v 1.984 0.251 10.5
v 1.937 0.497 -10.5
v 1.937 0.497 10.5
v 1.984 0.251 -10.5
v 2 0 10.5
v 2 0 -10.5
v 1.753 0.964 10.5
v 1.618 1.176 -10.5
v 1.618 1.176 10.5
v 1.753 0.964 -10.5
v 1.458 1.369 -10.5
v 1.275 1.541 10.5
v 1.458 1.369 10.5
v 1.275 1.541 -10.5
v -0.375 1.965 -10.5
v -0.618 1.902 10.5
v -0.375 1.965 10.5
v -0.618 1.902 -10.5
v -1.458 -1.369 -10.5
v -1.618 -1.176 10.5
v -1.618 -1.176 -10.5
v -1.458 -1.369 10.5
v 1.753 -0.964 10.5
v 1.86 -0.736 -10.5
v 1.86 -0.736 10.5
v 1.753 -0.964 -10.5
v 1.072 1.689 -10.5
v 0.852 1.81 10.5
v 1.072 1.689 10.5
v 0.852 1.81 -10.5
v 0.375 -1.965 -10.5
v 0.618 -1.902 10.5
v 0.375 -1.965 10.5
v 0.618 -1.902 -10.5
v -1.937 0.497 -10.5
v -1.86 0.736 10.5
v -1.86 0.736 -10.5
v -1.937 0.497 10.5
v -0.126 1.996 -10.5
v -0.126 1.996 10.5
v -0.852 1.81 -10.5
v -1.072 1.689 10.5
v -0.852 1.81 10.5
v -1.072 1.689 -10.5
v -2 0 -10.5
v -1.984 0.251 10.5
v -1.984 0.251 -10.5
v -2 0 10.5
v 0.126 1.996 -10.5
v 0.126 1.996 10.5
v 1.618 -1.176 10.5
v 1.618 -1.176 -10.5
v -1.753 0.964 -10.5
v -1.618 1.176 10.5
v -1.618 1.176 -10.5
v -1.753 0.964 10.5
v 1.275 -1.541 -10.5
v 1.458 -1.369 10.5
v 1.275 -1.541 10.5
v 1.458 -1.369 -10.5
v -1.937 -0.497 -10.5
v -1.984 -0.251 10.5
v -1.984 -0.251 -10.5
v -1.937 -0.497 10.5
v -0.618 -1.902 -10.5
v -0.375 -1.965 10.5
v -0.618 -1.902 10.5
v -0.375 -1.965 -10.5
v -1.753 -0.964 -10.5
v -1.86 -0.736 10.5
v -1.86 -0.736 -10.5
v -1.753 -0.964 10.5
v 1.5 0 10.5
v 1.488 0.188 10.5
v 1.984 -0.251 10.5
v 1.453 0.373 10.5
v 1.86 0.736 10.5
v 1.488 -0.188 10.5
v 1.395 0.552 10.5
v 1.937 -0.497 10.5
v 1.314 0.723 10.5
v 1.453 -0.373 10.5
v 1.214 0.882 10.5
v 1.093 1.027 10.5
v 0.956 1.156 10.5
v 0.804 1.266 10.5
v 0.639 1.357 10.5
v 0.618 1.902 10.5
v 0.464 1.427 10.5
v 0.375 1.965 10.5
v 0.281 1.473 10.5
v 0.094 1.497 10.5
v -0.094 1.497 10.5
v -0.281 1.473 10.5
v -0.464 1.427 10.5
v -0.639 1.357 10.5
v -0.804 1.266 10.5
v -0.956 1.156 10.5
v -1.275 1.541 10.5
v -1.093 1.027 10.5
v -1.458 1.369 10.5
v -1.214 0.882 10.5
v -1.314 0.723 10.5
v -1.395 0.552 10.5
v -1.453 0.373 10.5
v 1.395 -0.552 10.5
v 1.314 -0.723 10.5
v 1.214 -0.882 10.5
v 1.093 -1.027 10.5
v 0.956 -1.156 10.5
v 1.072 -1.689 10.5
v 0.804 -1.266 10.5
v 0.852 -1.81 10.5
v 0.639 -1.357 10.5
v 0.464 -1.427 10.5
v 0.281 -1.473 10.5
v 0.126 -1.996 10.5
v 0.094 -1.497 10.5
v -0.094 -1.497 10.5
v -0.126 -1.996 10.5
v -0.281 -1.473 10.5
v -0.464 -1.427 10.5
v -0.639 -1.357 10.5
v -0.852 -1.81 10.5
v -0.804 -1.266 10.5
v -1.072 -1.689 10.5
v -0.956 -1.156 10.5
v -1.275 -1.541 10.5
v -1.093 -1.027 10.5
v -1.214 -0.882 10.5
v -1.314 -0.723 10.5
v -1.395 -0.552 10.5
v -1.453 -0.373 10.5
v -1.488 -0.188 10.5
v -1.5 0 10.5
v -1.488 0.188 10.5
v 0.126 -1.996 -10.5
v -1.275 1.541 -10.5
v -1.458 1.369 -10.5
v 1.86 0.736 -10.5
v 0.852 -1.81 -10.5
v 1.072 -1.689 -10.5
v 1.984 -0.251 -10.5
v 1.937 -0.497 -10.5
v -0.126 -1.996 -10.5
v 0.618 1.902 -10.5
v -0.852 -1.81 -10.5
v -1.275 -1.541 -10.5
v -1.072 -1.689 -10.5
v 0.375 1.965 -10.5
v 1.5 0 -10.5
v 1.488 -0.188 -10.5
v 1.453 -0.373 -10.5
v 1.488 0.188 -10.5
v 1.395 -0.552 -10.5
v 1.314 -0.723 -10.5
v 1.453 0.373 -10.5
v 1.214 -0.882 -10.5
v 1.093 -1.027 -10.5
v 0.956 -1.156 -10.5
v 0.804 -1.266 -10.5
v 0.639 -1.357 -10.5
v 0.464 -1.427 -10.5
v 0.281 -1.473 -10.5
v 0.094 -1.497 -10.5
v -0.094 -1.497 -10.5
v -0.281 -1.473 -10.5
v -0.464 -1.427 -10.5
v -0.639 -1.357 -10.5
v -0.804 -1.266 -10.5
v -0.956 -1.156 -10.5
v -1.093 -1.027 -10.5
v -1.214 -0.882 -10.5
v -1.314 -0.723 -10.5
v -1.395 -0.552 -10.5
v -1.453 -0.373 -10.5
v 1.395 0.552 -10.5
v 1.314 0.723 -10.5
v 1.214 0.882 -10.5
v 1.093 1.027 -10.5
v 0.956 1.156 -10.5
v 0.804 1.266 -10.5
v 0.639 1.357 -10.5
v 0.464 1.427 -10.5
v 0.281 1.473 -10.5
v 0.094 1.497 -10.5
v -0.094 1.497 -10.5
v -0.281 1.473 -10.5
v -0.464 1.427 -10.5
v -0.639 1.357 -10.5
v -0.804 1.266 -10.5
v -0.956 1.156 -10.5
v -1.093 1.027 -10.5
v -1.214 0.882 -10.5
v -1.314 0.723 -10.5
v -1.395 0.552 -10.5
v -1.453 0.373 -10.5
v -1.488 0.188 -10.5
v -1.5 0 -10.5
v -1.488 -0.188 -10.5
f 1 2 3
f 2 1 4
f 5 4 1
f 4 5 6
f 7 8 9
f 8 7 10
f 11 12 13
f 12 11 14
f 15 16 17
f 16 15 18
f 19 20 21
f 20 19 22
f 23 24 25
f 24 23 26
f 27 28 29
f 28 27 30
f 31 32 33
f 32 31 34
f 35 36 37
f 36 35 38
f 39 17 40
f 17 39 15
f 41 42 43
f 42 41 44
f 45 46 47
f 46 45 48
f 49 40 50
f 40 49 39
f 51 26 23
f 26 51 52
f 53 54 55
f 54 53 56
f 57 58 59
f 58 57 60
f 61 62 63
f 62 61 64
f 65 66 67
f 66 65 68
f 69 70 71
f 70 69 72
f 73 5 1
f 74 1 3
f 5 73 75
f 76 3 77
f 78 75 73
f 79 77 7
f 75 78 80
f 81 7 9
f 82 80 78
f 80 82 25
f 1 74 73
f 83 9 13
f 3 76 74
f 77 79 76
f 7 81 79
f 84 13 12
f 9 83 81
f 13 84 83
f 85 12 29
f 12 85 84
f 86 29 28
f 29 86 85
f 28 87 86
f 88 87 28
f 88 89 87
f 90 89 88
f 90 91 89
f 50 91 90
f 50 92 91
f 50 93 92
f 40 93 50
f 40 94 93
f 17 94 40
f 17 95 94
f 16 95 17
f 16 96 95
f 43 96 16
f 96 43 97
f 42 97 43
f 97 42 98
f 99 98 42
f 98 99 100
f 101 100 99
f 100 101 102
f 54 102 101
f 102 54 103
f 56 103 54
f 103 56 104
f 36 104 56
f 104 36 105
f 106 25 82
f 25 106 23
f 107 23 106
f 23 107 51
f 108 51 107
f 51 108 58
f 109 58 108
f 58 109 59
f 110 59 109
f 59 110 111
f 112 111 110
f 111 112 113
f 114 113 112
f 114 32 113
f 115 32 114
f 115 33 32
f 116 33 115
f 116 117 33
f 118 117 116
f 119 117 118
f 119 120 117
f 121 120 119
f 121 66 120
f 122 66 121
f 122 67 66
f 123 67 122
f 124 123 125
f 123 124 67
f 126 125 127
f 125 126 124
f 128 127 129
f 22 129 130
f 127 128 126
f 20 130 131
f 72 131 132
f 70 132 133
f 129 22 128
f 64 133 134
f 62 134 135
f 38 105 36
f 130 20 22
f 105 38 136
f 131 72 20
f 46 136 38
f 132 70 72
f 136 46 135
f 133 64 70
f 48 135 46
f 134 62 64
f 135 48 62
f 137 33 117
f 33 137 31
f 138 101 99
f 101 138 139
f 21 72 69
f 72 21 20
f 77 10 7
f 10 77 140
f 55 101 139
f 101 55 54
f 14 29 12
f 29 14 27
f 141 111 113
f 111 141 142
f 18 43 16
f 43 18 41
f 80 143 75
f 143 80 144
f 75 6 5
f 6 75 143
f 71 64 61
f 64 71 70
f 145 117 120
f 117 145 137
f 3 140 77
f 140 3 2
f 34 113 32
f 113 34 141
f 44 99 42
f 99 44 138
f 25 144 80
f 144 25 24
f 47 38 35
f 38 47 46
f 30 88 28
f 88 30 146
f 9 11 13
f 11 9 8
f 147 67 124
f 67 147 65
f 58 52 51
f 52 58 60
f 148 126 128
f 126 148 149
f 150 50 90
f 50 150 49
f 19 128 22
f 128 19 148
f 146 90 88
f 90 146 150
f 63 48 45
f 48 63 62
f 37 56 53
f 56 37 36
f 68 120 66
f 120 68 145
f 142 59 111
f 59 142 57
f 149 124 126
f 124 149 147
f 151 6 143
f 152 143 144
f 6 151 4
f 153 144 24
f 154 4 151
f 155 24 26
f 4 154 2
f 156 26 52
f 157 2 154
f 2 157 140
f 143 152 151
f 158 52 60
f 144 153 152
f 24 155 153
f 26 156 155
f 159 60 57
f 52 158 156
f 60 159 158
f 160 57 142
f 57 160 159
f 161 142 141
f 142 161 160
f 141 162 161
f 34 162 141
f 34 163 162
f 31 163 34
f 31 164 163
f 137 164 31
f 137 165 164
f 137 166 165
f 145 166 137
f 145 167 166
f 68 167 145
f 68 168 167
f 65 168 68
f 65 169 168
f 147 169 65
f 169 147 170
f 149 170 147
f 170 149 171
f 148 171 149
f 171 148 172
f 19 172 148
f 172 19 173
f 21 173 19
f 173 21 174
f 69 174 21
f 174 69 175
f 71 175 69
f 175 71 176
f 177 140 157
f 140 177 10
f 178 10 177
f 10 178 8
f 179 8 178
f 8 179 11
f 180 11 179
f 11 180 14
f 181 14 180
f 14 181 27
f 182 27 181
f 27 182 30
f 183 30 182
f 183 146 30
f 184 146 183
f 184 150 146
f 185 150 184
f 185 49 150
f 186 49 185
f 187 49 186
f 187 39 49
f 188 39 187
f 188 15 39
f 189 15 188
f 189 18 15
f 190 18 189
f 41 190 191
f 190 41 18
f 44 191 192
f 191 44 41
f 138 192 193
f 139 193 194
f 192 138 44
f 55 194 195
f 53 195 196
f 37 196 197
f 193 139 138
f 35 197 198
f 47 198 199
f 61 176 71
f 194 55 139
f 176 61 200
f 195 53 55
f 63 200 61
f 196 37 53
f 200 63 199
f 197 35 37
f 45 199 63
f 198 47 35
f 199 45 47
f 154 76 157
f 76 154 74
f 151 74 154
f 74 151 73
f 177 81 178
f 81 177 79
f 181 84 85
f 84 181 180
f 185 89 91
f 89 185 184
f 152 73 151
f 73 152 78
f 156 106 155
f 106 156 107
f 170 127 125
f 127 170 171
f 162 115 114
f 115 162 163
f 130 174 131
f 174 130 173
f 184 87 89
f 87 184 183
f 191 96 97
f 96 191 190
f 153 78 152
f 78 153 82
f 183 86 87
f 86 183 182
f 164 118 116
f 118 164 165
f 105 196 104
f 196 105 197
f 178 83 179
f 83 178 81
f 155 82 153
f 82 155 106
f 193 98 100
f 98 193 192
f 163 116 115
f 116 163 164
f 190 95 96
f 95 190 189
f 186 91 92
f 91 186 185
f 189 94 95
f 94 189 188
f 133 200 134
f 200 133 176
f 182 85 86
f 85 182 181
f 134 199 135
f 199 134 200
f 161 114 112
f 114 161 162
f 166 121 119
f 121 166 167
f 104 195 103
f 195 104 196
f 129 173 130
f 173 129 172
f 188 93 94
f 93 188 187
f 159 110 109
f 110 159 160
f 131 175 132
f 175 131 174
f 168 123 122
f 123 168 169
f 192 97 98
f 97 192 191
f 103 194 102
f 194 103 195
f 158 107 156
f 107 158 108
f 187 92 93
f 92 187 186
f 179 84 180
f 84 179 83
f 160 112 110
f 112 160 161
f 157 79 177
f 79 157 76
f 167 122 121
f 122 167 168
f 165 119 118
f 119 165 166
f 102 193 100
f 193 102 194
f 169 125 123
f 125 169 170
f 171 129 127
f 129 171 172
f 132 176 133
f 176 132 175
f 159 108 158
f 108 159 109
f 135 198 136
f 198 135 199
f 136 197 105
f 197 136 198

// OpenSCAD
$fn = 50;


difference() {
	union() {
		translate(v = [0, 0, -10.5000000000]) {
			cylinder(h = 21, r = 2.0000000000);
		}
	}
	union() {
		translate(v = [0, 0, -100.0000000000]) {
			cylinder(h = 200, r = 1.5000000000);
		}
	}
}
